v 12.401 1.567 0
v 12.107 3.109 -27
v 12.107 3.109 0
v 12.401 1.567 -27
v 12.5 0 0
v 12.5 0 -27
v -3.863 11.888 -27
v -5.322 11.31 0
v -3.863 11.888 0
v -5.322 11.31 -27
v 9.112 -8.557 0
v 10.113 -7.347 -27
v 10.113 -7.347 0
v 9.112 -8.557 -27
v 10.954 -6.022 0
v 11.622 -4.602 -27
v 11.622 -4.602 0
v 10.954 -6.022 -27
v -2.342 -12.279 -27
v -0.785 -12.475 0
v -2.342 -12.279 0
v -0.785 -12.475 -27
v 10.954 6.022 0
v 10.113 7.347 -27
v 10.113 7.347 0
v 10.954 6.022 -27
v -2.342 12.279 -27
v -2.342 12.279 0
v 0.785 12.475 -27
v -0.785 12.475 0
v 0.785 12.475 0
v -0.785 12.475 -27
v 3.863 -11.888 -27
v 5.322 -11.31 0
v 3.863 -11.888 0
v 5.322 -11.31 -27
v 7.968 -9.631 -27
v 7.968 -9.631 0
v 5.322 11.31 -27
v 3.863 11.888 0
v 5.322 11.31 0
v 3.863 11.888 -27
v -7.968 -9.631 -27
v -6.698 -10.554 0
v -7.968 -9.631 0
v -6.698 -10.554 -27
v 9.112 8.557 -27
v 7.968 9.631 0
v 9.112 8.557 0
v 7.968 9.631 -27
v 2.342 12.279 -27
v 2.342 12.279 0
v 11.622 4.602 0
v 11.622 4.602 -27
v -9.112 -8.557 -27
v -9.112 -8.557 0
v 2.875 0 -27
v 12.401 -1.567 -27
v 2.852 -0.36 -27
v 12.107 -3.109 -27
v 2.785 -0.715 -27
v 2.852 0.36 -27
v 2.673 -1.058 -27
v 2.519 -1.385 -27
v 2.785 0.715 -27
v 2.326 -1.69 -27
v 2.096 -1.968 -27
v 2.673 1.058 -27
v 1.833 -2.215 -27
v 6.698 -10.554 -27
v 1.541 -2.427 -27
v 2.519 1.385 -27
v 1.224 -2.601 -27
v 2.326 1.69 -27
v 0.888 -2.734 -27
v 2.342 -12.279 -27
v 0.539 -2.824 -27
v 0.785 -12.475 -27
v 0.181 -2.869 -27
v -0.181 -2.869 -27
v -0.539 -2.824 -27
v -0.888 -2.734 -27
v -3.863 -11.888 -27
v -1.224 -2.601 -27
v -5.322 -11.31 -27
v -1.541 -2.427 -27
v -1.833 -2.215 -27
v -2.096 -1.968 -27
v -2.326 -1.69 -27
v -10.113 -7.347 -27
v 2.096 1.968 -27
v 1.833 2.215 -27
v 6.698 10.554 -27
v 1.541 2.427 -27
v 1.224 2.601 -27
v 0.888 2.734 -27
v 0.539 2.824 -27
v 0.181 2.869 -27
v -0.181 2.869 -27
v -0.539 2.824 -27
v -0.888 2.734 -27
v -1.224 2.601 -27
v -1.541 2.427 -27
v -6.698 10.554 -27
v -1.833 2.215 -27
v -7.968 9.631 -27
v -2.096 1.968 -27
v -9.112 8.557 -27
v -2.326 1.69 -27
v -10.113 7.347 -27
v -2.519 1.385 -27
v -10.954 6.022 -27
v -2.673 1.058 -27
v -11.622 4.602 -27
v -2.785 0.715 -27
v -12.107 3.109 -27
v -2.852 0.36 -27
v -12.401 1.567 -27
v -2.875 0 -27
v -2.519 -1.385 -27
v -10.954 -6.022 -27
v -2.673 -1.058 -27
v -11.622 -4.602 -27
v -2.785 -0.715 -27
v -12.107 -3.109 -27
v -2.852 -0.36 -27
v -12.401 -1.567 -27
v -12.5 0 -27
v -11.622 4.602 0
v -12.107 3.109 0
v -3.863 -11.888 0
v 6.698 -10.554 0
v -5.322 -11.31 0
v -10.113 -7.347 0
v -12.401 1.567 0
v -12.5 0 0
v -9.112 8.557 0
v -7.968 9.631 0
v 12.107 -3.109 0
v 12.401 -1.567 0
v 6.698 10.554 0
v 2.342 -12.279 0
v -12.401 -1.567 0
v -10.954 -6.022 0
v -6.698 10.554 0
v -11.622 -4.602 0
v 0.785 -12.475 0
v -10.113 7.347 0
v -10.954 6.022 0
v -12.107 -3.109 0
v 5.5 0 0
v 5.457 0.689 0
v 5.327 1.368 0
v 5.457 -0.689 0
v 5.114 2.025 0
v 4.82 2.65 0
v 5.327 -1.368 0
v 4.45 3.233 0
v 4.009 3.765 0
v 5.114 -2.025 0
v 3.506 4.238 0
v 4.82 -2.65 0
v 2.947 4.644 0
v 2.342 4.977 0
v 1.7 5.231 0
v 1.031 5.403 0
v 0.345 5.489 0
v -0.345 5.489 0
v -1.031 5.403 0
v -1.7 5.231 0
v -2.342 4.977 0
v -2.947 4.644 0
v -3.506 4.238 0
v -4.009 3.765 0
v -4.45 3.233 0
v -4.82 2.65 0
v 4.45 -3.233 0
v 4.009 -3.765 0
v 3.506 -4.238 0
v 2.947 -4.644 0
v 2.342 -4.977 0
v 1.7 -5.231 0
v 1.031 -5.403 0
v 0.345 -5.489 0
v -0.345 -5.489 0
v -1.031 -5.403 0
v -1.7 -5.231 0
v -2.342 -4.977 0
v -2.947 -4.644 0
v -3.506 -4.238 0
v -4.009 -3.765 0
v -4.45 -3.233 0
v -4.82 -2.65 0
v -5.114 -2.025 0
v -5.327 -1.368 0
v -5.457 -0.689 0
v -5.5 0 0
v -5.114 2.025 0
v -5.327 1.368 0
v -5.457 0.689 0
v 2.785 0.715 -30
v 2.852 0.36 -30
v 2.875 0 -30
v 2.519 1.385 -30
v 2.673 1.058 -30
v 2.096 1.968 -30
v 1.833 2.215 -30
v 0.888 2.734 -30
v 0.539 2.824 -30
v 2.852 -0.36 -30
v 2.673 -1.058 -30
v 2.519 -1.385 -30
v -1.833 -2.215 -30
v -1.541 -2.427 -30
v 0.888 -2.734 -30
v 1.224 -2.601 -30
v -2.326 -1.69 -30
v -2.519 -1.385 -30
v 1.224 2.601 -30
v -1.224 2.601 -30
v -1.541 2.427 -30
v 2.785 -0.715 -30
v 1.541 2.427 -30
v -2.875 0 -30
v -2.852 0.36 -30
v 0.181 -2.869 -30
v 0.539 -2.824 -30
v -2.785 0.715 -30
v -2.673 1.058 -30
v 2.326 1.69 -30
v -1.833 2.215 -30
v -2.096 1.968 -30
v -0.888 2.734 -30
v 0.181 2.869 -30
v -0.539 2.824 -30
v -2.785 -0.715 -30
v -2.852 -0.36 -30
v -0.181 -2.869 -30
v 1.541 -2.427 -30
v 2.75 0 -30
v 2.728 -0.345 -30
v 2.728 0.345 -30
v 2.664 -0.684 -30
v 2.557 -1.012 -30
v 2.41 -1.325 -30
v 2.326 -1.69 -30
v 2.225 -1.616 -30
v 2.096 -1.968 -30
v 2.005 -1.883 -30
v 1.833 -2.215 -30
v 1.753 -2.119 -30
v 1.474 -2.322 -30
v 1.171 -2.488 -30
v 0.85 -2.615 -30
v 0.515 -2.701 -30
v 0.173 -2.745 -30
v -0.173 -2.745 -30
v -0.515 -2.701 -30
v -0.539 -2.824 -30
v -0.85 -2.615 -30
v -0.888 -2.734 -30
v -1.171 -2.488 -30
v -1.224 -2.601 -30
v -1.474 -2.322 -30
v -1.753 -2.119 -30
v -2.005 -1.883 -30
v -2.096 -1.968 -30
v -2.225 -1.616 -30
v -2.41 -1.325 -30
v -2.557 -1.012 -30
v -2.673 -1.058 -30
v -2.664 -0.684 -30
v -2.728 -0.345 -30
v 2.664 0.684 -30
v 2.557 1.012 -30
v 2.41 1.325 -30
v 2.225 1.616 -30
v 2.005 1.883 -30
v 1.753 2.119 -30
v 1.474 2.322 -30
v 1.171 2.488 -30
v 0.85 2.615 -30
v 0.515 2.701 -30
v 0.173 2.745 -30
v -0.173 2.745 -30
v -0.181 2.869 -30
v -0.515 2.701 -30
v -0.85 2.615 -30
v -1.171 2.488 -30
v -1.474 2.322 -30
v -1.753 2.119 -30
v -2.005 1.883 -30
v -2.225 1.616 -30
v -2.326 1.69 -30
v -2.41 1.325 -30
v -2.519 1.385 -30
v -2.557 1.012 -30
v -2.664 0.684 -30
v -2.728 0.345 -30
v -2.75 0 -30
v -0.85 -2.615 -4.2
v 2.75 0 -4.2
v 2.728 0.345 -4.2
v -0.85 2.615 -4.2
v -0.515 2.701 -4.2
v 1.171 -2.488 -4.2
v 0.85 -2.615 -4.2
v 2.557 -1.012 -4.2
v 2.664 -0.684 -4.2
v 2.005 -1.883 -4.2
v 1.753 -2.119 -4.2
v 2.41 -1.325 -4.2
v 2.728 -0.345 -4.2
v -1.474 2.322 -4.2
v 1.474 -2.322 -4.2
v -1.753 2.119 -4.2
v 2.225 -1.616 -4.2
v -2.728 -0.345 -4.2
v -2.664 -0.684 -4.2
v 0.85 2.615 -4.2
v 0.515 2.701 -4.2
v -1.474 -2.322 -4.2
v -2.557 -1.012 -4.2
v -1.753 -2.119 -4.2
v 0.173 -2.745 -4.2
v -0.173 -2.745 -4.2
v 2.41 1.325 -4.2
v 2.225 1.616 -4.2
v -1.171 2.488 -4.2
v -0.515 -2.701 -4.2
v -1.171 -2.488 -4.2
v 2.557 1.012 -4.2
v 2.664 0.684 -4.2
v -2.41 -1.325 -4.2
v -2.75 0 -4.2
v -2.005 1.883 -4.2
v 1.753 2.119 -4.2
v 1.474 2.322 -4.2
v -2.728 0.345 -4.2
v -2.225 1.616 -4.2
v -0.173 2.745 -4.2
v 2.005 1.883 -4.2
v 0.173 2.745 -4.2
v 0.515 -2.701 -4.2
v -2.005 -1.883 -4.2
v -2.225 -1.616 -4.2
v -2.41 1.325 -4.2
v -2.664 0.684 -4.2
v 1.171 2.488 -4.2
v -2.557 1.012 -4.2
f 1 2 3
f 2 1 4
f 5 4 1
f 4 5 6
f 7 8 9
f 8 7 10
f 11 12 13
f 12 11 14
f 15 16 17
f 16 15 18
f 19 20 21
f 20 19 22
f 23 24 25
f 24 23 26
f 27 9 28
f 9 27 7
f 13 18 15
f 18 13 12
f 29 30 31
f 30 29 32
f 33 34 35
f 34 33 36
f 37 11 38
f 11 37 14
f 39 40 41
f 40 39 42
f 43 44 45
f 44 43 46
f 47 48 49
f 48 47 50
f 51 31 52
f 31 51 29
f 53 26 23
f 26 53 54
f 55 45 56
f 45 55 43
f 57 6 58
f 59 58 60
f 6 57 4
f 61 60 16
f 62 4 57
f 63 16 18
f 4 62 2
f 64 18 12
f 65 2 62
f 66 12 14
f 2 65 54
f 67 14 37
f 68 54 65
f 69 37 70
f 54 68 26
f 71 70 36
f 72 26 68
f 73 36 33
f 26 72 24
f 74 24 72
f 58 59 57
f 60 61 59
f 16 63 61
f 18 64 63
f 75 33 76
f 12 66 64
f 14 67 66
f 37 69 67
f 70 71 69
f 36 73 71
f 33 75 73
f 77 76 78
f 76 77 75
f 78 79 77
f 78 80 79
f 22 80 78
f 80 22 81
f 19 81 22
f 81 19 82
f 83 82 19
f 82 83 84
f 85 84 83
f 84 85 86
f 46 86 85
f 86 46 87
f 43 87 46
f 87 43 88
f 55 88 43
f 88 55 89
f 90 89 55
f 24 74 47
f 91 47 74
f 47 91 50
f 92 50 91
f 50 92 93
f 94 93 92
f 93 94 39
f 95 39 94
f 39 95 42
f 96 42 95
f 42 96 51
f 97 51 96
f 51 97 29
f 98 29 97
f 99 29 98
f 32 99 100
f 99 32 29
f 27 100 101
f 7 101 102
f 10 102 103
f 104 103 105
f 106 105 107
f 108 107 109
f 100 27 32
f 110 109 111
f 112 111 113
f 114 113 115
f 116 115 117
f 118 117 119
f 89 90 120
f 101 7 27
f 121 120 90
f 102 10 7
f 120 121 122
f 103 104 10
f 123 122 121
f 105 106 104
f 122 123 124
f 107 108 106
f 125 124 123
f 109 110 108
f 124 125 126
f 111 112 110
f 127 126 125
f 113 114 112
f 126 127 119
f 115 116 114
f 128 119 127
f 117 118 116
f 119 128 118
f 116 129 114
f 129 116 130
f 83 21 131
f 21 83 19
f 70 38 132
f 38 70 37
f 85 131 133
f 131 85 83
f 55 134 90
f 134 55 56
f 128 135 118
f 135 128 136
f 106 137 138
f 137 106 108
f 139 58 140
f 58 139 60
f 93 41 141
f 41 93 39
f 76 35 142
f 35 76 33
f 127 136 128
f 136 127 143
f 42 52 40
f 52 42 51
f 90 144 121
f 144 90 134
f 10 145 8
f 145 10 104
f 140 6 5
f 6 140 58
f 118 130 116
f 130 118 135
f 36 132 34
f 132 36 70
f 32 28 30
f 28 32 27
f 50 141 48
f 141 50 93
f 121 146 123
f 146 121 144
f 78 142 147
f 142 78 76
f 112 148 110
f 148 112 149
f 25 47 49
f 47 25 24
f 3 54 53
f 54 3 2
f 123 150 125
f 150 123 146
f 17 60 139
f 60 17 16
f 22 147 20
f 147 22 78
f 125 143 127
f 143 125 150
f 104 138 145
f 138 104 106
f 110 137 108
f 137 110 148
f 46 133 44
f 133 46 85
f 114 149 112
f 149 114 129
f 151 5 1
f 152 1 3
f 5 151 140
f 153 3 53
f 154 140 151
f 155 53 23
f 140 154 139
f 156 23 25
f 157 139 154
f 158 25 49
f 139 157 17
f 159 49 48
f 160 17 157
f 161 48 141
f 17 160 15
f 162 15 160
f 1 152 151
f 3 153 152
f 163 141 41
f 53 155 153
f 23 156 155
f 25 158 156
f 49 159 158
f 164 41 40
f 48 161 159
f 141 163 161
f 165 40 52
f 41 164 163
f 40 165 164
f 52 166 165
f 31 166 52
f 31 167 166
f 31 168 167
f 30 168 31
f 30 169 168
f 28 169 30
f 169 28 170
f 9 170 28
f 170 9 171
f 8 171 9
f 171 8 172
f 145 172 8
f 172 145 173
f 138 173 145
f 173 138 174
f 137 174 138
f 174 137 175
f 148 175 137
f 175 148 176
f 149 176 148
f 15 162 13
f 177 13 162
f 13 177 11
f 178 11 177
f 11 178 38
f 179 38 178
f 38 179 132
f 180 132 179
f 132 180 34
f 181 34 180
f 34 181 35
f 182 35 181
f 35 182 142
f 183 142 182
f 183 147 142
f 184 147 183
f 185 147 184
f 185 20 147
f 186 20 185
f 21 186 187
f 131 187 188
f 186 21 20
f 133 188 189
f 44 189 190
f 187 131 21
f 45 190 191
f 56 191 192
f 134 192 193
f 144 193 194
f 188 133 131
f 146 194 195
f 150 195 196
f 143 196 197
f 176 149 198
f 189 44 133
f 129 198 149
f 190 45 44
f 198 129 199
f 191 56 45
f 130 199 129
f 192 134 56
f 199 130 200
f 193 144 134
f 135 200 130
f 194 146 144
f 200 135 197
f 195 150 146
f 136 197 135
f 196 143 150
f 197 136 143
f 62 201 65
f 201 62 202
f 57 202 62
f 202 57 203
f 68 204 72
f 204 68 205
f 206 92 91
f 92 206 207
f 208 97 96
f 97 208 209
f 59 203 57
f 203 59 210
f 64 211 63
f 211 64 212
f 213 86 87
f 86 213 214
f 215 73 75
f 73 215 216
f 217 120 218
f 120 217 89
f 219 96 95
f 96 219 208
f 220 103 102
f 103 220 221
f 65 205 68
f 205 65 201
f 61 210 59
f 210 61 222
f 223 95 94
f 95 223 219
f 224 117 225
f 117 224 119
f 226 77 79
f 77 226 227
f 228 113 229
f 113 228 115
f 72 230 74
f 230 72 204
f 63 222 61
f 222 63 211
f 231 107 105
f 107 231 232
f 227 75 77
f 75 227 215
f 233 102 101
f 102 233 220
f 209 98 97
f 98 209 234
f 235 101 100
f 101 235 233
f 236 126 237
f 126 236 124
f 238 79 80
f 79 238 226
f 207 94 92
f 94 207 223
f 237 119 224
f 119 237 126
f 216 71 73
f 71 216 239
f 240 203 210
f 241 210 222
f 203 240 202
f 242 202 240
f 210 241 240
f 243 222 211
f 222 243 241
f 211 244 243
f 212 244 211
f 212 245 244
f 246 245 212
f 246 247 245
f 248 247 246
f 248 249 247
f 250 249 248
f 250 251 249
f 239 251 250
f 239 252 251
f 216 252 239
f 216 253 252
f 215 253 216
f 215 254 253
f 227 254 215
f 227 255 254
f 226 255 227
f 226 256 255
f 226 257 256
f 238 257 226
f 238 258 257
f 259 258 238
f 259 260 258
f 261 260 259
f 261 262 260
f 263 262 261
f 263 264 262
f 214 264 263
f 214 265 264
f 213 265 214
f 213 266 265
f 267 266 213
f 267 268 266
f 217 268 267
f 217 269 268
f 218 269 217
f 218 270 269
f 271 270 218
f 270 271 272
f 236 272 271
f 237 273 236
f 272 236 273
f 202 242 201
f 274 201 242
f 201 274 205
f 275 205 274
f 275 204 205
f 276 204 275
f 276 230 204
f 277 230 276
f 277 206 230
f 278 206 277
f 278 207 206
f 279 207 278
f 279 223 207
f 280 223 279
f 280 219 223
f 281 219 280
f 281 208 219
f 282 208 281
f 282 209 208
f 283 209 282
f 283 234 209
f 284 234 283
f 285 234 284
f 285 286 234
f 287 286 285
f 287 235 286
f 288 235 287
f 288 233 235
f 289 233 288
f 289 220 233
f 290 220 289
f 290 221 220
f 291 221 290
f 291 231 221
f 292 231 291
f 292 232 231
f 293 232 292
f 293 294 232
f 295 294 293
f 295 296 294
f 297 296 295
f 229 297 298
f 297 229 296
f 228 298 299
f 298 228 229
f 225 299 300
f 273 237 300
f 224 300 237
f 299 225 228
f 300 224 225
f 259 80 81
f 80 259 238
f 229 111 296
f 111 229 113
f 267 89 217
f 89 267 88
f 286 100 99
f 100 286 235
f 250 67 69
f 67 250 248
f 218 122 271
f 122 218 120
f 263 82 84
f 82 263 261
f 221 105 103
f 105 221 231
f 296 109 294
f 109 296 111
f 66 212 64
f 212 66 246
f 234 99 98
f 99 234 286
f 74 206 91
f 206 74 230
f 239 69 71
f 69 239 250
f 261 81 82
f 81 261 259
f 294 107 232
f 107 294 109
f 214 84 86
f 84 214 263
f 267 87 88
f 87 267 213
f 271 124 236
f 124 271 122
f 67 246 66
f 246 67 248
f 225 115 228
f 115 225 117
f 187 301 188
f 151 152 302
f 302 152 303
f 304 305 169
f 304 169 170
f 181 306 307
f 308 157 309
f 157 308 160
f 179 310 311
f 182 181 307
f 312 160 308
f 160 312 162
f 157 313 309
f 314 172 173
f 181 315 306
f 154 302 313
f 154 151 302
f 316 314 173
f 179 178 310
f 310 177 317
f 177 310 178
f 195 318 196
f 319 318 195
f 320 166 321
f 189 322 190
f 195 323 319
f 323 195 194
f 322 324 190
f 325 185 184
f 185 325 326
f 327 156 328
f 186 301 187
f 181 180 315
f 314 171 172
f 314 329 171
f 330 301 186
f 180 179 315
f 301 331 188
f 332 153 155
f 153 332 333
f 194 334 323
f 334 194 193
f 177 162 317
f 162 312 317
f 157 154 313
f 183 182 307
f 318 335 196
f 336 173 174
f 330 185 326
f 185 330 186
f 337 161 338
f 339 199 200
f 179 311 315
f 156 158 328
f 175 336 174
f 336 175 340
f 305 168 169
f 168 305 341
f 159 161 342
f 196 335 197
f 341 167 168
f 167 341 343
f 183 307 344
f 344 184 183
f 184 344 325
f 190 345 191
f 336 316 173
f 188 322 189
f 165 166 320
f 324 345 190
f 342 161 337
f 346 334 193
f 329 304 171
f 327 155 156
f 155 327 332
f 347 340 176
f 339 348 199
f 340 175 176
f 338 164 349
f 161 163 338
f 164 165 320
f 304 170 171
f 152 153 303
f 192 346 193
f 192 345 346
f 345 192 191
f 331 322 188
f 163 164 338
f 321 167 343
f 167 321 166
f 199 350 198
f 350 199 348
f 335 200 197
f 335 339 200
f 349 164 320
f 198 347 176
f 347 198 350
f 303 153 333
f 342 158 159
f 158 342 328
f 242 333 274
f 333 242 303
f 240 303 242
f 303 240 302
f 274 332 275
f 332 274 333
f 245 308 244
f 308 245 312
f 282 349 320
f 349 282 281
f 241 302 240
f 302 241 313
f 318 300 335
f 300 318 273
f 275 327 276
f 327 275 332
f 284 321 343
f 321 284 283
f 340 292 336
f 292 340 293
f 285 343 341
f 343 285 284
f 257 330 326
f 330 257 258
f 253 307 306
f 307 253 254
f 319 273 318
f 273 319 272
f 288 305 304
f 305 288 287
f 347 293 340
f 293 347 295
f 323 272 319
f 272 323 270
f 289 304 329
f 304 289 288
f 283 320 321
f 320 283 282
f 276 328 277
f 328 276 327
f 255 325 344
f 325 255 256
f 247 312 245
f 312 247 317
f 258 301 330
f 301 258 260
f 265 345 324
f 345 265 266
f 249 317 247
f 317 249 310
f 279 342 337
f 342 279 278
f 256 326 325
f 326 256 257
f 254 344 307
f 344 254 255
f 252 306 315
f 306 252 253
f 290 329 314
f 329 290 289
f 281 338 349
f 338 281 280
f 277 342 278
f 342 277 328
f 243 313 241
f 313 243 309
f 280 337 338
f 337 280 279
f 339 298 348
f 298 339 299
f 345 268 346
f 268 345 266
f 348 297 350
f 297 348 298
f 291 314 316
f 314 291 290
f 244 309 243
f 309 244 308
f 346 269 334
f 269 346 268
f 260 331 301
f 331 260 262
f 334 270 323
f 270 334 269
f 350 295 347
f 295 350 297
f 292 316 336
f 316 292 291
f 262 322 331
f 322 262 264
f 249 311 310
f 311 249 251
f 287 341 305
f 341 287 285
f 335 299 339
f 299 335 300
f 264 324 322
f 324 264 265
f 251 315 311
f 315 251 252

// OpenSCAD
$fn = 50;

difference() {
	union() {
		translate(v = [0, 0, -27.0]) {
			cylinder(h = 27, r = 12.5);
		}
		#translate(v = [0, 0, -30.0]) {
			cylinder(h = 30, r = 2.875);
		}
	}
	union() {
		translate(v = [0, 0, 0]) {
			rotate(a = [0, 0, 0]) {
				difference() {
					union() {
						translate(v = [0, 0, -30.0]) {
							cylinder(h = 30, r = 2.25);
						}
						translate(v = [0, 0, -4.2]) {
							cylinder(h = 4.2, r1 = 2.75, r2 = 5.5);
						}
						translate(v = [0, 0, -30.0]) {
							cylinder(h = 30, r = 2.75);
						}
						translate(v = [0, 0, -30.0]) {
							cylinder(h = 30, r = 2.25);
						}
					}
					union();
				}
			}
		}
	}
}
